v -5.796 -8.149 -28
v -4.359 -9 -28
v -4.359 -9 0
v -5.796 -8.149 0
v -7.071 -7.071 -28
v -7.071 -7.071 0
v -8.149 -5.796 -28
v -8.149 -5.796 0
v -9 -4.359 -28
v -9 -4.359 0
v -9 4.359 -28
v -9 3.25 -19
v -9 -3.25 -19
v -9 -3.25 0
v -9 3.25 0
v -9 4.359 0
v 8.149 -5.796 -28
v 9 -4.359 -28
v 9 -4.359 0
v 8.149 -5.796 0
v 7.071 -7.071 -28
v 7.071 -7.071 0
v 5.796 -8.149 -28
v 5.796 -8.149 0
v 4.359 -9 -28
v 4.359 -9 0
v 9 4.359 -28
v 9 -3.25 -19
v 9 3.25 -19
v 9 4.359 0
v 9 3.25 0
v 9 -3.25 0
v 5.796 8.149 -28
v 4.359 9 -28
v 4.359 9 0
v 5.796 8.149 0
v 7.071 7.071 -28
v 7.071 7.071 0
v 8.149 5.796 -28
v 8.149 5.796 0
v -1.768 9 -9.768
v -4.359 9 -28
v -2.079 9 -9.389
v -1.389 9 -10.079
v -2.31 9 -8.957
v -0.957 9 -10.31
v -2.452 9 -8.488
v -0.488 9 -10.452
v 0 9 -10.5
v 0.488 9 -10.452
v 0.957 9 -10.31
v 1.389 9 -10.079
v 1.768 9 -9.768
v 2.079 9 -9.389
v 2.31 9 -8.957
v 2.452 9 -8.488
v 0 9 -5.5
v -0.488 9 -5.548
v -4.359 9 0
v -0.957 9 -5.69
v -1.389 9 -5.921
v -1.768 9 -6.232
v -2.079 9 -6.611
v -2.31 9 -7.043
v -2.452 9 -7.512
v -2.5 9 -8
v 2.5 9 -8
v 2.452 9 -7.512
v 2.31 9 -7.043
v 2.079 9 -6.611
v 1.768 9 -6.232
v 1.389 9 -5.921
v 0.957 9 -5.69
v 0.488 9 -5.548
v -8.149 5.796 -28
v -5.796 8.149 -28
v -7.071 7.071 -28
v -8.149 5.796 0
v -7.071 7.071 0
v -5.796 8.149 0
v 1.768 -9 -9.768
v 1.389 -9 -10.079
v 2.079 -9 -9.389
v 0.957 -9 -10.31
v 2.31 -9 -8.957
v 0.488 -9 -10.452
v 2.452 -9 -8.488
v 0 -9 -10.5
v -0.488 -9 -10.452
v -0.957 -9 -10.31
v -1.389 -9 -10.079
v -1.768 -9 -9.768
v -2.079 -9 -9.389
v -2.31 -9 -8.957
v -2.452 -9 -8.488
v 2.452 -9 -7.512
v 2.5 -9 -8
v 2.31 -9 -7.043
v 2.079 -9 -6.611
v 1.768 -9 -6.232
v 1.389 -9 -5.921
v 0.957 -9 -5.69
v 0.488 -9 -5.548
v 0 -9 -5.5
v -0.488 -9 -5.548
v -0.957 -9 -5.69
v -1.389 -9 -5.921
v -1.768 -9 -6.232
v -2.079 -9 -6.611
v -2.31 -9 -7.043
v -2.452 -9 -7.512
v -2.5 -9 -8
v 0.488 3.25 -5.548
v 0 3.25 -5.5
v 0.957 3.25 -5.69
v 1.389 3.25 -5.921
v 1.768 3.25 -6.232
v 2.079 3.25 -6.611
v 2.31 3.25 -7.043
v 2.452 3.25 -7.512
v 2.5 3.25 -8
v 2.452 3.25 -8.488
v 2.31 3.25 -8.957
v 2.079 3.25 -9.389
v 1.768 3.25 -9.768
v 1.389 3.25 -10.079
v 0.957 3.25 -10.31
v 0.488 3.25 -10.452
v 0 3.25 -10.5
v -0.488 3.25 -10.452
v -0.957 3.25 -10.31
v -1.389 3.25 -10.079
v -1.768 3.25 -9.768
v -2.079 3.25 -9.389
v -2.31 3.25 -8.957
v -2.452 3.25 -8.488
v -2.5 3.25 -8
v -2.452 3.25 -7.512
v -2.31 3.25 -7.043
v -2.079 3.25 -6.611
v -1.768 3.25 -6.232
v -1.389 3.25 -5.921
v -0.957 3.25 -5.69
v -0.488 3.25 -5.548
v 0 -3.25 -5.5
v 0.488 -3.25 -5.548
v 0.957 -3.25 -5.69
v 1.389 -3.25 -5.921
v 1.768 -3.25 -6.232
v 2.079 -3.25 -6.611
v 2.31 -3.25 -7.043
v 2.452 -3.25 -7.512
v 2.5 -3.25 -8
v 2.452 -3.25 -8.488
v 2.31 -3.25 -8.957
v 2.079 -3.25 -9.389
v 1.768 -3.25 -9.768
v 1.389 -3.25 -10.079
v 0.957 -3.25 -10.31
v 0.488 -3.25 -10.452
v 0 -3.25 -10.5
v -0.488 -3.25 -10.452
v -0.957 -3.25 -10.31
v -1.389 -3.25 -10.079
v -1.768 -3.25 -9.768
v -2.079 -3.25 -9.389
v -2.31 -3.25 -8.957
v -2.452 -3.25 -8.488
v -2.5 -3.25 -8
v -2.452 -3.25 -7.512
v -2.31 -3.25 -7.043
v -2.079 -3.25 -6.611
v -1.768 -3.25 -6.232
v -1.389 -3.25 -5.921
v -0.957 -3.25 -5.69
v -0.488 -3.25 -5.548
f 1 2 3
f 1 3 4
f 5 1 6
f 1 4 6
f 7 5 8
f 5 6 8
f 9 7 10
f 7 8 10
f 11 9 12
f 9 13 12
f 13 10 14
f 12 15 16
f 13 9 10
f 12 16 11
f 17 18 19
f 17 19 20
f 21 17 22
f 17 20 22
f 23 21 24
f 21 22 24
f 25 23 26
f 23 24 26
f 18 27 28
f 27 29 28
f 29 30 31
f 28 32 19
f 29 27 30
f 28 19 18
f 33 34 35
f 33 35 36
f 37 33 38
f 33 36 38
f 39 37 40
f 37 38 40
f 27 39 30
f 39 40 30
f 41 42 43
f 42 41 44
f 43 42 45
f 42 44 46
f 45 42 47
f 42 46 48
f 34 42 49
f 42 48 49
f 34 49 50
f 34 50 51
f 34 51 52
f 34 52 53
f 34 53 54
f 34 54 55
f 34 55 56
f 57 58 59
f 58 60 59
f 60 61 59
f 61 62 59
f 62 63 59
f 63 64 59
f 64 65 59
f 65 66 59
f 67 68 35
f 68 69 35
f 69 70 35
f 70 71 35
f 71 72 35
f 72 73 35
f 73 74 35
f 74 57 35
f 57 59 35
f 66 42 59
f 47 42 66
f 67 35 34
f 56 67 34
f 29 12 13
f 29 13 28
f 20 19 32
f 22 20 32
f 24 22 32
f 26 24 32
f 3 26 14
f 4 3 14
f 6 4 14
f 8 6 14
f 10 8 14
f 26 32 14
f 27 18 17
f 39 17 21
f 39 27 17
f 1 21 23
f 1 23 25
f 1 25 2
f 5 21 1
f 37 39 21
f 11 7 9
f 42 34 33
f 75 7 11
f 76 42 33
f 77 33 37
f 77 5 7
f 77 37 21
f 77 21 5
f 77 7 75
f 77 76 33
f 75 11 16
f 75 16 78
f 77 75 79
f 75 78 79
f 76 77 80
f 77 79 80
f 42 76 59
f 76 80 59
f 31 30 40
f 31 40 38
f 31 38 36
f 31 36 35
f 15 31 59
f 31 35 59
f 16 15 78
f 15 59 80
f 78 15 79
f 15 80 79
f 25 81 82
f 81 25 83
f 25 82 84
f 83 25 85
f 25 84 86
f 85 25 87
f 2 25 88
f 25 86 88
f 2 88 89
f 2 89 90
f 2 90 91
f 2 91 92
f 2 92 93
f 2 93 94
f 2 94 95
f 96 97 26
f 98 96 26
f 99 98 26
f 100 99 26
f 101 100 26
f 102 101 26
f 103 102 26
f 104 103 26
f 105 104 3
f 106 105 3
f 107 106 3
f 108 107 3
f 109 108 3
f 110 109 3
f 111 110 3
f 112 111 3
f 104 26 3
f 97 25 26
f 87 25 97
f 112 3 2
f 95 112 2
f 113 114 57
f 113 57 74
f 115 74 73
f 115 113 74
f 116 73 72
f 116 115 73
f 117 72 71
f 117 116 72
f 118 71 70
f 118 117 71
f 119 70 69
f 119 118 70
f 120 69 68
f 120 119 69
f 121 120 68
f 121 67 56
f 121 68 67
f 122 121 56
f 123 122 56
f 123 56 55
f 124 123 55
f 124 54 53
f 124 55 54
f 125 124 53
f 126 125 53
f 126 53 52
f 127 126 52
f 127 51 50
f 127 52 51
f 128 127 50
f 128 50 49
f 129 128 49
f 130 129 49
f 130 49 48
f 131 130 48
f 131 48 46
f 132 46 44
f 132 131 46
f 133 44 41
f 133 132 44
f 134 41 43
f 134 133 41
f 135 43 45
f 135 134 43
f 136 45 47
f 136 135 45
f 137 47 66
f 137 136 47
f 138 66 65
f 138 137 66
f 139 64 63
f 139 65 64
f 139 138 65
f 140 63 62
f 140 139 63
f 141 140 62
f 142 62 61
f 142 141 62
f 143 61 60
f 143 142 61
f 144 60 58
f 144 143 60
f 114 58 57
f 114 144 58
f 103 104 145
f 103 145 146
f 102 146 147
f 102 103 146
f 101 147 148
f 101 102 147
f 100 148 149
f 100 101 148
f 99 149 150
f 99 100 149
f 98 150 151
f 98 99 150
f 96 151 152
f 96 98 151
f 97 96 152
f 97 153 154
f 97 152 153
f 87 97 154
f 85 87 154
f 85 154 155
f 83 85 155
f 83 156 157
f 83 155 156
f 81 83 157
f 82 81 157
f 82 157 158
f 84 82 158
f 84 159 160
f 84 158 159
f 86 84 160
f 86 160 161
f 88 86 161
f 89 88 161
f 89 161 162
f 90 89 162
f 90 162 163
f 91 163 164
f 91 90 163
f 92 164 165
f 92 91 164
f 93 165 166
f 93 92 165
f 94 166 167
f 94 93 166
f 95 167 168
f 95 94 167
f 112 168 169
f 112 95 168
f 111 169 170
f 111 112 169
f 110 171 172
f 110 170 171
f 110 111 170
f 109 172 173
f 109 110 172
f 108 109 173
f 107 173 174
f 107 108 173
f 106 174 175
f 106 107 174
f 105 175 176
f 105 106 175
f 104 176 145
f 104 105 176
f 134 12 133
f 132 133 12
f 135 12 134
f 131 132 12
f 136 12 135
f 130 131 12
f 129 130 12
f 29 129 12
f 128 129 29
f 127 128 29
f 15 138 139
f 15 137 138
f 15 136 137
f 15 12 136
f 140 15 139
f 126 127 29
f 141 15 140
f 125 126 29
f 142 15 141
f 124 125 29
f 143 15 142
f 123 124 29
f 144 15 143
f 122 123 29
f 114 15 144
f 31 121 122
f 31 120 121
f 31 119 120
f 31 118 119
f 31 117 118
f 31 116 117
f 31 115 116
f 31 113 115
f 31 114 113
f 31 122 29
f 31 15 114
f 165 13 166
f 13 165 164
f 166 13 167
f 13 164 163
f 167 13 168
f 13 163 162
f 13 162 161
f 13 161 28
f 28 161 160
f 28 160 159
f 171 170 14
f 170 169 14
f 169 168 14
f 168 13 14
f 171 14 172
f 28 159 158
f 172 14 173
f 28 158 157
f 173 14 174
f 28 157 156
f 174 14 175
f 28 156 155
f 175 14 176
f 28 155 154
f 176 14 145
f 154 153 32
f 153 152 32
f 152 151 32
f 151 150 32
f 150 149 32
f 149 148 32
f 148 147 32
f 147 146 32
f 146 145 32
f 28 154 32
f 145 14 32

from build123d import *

# Parameters (mm, degrees)
BOSS_EXTRUDE2_DEPTH      = 28
SKETCH3_W                = 18
SKETCH3_H                = 6.5
CUT_EXTRUDE9_DEPTH       = 19
CUT_EXTRUDE10_DEPTH      = 31.757112998
CUT_EXTRUDE10_DEPTH_BACK = 31.757112998
SKETCH4_R                = 2.5


with BuildPart() as part:
    # Sketch1 → Boss-Extrude2 (new body)
    with BuildSketch(Plane.XY):
        with BuildLine():
            Line((-4.358898944, 9), (4.358898944, 9))
            ThreePointArc((4.358898944, 9), (7.071067812, 7.071067812), (9, 4.358898944))
            Line((9, 4.358898944), (9, -4.358898944))
            ThreePointArc((9, -4.358898944), (7.071067812, -7.071067812), (4.358898944, -9))
            Line((4.358898944, -9), (-4.358898944, -9))
            ThreePointArc((-4.358898944, -9), (-7.071067812, -7.071067812), (-9, -4.358898944))
            Line((-9, -4.358898944), (-9, 4.358898944))
            ThreePointArc((-9, 4.358898944), (-7.071067812, 7.071067812), (-4.358898944, 9))
        make_face()
    extrude(amount=-BOSS_EXTRUDE2_DEPTH)

    # Sketch3 → Cut-Extrude9 (cut)
    with BuildSketch(Plane.XY):
        Rectangle(SKETCH3_W, SKETCH3_H)
    extrude(amount=-CUT_EXTRUDE9_DEPTH, mode=Mode.SUBTRACT)

    # Sketch4 → Cut-Extrude10 (cut, two sides: drawn at the far end of the back side and taken through both)
    with BuildSketch(Plane(origin=(0, 0, 0), x_dir=(1, 0, 0), z_dir=(0, 1, 0)).offset(-CUT_EXTRUDE10_DEPTH_BACK)):
        with Locations(Location((0, 8, 0), (0, 0, 270))):
            Circle(SKETCH4_R)
    extrude(amount=CUT_EXTRUDE10_DEPTH + CUT_EXTRUDE10_DEPTH_BACK, mode=Mode.SUBTRACT)


solid = part.part
